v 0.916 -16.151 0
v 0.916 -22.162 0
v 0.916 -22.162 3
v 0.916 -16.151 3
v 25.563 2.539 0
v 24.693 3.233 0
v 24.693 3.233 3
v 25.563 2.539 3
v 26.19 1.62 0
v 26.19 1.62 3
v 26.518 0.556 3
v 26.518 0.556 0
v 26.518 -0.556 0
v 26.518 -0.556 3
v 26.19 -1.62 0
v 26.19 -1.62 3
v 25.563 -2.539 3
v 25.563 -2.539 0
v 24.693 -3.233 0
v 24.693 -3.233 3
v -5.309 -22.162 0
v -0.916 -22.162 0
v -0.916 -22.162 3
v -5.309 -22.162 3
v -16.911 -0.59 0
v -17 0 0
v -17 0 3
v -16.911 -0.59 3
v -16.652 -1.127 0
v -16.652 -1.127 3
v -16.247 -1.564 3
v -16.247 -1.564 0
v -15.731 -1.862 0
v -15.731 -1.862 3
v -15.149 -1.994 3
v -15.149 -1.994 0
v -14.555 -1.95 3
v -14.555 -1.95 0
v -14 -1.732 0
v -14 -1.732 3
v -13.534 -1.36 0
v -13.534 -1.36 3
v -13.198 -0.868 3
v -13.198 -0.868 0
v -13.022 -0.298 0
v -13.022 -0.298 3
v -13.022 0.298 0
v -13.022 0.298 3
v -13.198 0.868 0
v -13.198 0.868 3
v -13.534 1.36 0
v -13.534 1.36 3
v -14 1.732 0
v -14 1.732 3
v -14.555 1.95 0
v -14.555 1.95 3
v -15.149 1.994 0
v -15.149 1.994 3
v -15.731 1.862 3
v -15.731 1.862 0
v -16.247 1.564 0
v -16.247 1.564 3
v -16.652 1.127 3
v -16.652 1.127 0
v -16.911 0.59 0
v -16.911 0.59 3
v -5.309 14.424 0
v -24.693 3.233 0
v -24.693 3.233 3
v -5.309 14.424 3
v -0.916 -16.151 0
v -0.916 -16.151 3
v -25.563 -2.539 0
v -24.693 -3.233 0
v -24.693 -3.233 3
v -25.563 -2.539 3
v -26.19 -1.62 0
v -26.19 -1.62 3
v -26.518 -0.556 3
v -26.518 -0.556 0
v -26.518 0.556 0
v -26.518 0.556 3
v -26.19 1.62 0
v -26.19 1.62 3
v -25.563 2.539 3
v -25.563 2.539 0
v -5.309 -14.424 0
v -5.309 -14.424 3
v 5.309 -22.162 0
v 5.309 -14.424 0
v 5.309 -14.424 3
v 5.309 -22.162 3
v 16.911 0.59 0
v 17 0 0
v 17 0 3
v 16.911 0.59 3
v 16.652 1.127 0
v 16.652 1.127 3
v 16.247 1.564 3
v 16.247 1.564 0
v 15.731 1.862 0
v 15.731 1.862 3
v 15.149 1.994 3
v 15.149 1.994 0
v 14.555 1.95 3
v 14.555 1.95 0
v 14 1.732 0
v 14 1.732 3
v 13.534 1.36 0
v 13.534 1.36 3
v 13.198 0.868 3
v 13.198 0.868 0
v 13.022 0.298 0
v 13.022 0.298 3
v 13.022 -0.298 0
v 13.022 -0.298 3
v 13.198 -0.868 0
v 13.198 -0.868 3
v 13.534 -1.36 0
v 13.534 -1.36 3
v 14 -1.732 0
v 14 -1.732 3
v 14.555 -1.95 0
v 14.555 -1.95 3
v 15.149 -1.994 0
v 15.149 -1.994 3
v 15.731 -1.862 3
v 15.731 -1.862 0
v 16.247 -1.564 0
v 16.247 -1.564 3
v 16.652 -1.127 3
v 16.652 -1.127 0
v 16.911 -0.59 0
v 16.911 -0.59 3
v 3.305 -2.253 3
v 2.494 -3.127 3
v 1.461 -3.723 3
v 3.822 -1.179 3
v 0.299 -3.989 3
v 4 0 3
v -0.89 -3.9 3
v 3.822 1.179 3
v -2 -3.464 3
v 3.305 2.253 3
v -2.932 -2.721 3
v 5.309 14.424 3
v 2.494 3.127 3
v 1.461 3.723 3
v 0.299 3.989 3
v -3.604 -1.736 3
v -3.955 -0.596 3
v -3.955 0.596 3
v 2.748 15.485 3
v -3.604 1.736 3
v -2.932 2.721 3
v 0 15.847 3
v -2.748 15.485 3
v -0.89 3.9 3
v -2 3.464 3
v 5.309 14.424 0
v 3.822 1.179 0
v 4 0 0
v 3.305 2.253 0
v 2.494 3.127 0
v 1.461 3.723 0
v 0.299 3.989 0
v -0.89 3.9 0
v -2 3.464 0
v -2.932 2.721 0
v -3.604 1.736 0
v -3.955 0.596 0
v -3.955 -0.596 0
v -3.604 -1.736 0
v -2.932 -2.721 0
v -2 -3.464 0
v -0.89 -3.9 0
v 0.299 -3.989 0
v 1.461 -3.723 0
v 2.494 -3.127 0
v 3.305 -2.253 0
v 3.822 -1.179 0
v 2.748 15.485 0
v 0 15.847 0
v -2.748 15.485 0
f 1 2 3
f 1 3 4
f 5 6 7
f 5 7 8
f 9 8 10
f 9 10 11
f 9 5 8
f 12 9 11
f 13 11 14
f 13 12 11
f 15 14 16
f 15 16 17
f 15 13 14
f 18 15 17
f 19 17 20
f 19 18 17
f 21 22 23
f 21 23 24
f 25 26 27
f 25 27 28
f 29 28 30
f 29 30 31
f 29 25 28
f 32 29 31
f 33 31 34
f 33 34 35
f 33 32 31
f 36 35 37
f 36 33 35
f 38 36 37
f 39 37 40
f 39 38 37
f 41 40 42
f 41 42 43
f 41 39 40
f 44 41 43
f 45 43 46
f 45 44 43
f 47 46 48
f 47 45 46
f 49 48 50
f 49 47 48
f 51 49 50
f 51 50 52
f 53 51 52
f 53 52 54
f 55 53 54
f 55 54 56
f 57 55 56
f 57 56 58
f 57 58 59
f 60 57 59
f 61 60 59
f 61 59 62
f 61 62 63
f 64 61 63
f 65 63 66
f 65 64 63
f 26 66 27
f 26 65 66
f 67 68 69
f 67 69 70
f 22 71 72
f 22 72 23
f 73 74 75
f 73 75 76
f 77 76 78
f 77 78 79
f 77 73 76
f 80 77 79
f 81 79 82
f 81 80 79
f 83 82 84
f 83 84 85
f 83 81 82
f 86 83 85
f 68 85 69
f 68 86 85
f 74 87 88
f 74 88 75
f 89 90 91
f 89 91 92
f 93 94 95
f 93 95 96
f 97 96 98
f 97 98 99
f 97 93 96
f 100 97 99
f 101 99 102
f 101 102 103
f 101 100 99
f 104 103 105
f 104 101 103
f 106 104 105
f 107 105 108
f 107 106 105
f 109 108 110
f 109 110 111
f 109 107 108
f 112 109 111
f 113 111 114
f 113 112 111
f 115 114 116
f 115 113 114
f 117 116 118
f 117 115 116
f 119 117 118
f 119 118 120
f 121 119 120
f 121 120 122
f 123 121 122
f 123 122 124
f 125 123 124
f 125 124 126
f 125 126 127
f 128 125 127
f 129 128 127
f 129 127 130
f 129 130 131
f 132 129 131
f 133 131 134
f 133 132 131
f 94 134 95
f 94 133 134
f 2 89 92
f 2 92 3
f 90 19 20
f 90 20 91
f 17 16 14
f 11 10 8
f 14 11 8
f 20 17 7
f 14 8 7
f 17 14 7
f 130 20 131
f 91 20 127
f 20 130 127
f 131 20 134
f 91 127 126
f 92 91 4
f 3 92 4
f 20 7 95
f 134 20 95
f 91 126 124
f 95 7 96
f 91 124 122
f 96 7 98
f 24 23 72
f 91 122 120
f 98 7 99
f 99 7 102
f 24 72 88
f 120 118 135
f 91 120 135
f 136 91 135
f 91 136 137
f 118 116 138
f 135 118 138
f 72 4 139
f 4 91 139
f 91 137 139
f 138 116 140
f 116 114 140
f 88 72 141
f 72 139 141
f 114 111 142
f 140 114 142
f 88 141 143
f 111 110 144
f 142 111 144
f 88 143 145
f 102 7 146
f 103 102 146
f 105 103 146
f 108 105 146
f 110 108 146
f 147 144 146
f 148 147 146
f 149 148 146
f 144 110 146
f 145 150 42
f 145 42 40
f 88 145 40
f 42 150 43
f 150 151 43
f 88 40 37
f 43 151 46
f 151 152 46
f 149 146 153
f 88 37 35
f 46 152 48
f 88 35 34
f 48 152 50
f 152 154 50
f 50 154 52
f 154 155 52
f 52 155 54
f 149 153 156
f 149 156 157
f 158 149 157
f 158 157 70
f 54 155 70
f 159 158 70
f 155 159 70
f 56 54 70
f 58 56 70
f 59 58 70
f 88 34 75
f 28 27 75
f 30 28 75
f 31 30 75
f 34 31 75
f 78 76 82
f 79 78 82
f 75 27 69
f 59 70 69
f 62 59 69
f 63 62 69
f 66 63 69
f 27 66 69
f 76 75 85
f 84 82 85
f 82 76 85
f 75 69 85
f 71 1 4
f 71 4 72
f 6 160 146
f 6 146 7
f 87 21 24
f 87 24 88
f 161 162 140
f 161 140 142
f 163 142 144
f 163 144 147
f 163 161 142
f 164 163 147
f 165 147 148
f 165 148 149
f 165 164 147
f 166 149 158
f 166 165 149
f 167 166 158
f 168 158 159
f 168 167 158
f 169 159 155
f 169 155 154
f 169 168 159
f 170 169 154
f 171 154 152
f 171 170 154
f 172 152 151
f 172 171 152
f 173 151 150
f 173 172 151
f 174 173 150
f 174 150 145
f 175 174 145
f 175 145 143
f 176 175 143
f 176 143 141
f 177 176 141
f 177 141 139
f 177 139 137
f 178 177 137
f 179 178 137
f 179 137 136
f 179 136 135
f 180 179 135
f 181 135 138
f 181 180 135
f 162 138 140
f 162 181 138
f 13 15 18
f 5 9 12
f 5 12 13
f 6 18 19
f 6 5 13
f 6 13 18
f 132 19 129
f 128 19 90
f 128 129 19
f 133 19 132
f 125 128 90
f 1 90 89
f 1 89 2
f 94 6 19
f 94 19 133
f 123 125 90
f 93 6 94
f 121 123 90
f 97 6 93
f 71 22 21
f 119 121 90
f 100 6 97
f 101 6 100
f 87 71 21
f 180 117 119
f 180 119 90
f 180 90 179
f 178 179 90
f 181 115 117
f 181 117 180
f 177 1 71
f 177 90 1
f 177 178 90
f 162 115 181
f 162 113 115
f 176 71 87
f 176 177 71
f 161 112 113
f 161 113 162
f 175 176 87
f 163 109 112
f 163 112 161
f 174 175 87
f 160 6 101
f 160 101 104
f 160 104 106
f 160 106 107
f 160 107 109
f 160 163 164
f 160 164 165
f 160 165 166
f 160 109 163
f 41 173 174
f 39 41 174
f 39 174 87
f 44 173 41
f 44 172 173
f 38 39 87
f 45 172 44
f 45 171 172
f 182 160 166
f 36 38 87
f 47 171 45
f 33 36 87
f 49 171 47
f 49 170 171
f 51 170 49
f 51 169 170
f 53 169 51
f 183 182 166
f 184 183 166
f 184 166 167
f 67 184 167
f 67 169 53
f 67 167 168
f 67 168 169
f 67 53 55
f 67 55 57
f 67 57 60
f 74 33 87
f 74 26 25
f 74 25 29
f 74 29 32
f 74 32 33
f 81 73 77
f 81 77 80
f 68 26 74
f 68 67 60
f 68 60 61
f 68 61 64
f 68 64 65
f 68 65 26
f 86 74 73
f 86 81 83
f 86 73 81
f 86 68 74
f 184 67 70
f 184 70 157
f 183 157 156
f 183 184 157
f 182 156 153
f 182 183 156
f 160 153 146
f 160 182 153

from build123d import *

# Parameters (mm, degrees)
SKETCH_1_R      = 4
SKETCH_1_R_2    = 2
EXTRUDE_1_DEPTH = 3


with BuildPart() as part:
    # 草图1 → 凸台-拉伸1 (new body)
    with BuildSketch(Plane.XY):
        with BuildLine():
            Line((5.309266756, 14.424138209), (24.693114579, 3.23286845))
            ThreePointArc((24.693114579, 3.23286845), (26.559612049, 0), (24.693114579, -3.23286845))
            Line((24.693114579, -3.23286845), (5.309266756, -14.424138209))
            Line((5.309266756, -14.424138209), (5.309266756, -22.162123177))
            Line((5.309266756, -22.162123177), (0.916263641, -22.162123177))
            Line((0.916263641, -22.162123177), (0.916263641, -16.150751559))
            Line((0.916263641, -16.150751559), (-0.916263641, -16.150751559))
            Line((-0.916263641, -16.150751559), (-0.916263641, -22.162123177))
            Line((-0.916263641, -22.162123177), (-5.309266756, -22.162123177))
            Line((-5.309266756, -22.162123177), (-5.309266756, -14.424138209))
            Line((-5.309266756, -14.424138209), (-24.693114579, -3.23286845))
            ThreePointArc((-24.693114579, -3.23286845), (-26.559612049, 0), (-24.693114579, 3.23286845))
            Line((-24.693114579, 3.23286845), (-5.309266756, 14.424138209))
            ThreePointArc((-5.309266756, 14.424138209), (0, 15.846751948), (5.309266756, 14.424138209))
        make_face()
        Circle(SKETCH_1_R, mode=Mode.SUBTRACT)
        with Locations((15, 0)):
            Circle(SKETCH_1_R_2, mode=Mode.SUBTRACT)
        with Locations(Location((-15, 0, 0), (0, 0, 180))):
            Circle(SKETCH_1_R_2, mode=Mode.SUBTRACT)
    extrude(amount=EXTRUDE_1_DEPTH)


solid = part.part
